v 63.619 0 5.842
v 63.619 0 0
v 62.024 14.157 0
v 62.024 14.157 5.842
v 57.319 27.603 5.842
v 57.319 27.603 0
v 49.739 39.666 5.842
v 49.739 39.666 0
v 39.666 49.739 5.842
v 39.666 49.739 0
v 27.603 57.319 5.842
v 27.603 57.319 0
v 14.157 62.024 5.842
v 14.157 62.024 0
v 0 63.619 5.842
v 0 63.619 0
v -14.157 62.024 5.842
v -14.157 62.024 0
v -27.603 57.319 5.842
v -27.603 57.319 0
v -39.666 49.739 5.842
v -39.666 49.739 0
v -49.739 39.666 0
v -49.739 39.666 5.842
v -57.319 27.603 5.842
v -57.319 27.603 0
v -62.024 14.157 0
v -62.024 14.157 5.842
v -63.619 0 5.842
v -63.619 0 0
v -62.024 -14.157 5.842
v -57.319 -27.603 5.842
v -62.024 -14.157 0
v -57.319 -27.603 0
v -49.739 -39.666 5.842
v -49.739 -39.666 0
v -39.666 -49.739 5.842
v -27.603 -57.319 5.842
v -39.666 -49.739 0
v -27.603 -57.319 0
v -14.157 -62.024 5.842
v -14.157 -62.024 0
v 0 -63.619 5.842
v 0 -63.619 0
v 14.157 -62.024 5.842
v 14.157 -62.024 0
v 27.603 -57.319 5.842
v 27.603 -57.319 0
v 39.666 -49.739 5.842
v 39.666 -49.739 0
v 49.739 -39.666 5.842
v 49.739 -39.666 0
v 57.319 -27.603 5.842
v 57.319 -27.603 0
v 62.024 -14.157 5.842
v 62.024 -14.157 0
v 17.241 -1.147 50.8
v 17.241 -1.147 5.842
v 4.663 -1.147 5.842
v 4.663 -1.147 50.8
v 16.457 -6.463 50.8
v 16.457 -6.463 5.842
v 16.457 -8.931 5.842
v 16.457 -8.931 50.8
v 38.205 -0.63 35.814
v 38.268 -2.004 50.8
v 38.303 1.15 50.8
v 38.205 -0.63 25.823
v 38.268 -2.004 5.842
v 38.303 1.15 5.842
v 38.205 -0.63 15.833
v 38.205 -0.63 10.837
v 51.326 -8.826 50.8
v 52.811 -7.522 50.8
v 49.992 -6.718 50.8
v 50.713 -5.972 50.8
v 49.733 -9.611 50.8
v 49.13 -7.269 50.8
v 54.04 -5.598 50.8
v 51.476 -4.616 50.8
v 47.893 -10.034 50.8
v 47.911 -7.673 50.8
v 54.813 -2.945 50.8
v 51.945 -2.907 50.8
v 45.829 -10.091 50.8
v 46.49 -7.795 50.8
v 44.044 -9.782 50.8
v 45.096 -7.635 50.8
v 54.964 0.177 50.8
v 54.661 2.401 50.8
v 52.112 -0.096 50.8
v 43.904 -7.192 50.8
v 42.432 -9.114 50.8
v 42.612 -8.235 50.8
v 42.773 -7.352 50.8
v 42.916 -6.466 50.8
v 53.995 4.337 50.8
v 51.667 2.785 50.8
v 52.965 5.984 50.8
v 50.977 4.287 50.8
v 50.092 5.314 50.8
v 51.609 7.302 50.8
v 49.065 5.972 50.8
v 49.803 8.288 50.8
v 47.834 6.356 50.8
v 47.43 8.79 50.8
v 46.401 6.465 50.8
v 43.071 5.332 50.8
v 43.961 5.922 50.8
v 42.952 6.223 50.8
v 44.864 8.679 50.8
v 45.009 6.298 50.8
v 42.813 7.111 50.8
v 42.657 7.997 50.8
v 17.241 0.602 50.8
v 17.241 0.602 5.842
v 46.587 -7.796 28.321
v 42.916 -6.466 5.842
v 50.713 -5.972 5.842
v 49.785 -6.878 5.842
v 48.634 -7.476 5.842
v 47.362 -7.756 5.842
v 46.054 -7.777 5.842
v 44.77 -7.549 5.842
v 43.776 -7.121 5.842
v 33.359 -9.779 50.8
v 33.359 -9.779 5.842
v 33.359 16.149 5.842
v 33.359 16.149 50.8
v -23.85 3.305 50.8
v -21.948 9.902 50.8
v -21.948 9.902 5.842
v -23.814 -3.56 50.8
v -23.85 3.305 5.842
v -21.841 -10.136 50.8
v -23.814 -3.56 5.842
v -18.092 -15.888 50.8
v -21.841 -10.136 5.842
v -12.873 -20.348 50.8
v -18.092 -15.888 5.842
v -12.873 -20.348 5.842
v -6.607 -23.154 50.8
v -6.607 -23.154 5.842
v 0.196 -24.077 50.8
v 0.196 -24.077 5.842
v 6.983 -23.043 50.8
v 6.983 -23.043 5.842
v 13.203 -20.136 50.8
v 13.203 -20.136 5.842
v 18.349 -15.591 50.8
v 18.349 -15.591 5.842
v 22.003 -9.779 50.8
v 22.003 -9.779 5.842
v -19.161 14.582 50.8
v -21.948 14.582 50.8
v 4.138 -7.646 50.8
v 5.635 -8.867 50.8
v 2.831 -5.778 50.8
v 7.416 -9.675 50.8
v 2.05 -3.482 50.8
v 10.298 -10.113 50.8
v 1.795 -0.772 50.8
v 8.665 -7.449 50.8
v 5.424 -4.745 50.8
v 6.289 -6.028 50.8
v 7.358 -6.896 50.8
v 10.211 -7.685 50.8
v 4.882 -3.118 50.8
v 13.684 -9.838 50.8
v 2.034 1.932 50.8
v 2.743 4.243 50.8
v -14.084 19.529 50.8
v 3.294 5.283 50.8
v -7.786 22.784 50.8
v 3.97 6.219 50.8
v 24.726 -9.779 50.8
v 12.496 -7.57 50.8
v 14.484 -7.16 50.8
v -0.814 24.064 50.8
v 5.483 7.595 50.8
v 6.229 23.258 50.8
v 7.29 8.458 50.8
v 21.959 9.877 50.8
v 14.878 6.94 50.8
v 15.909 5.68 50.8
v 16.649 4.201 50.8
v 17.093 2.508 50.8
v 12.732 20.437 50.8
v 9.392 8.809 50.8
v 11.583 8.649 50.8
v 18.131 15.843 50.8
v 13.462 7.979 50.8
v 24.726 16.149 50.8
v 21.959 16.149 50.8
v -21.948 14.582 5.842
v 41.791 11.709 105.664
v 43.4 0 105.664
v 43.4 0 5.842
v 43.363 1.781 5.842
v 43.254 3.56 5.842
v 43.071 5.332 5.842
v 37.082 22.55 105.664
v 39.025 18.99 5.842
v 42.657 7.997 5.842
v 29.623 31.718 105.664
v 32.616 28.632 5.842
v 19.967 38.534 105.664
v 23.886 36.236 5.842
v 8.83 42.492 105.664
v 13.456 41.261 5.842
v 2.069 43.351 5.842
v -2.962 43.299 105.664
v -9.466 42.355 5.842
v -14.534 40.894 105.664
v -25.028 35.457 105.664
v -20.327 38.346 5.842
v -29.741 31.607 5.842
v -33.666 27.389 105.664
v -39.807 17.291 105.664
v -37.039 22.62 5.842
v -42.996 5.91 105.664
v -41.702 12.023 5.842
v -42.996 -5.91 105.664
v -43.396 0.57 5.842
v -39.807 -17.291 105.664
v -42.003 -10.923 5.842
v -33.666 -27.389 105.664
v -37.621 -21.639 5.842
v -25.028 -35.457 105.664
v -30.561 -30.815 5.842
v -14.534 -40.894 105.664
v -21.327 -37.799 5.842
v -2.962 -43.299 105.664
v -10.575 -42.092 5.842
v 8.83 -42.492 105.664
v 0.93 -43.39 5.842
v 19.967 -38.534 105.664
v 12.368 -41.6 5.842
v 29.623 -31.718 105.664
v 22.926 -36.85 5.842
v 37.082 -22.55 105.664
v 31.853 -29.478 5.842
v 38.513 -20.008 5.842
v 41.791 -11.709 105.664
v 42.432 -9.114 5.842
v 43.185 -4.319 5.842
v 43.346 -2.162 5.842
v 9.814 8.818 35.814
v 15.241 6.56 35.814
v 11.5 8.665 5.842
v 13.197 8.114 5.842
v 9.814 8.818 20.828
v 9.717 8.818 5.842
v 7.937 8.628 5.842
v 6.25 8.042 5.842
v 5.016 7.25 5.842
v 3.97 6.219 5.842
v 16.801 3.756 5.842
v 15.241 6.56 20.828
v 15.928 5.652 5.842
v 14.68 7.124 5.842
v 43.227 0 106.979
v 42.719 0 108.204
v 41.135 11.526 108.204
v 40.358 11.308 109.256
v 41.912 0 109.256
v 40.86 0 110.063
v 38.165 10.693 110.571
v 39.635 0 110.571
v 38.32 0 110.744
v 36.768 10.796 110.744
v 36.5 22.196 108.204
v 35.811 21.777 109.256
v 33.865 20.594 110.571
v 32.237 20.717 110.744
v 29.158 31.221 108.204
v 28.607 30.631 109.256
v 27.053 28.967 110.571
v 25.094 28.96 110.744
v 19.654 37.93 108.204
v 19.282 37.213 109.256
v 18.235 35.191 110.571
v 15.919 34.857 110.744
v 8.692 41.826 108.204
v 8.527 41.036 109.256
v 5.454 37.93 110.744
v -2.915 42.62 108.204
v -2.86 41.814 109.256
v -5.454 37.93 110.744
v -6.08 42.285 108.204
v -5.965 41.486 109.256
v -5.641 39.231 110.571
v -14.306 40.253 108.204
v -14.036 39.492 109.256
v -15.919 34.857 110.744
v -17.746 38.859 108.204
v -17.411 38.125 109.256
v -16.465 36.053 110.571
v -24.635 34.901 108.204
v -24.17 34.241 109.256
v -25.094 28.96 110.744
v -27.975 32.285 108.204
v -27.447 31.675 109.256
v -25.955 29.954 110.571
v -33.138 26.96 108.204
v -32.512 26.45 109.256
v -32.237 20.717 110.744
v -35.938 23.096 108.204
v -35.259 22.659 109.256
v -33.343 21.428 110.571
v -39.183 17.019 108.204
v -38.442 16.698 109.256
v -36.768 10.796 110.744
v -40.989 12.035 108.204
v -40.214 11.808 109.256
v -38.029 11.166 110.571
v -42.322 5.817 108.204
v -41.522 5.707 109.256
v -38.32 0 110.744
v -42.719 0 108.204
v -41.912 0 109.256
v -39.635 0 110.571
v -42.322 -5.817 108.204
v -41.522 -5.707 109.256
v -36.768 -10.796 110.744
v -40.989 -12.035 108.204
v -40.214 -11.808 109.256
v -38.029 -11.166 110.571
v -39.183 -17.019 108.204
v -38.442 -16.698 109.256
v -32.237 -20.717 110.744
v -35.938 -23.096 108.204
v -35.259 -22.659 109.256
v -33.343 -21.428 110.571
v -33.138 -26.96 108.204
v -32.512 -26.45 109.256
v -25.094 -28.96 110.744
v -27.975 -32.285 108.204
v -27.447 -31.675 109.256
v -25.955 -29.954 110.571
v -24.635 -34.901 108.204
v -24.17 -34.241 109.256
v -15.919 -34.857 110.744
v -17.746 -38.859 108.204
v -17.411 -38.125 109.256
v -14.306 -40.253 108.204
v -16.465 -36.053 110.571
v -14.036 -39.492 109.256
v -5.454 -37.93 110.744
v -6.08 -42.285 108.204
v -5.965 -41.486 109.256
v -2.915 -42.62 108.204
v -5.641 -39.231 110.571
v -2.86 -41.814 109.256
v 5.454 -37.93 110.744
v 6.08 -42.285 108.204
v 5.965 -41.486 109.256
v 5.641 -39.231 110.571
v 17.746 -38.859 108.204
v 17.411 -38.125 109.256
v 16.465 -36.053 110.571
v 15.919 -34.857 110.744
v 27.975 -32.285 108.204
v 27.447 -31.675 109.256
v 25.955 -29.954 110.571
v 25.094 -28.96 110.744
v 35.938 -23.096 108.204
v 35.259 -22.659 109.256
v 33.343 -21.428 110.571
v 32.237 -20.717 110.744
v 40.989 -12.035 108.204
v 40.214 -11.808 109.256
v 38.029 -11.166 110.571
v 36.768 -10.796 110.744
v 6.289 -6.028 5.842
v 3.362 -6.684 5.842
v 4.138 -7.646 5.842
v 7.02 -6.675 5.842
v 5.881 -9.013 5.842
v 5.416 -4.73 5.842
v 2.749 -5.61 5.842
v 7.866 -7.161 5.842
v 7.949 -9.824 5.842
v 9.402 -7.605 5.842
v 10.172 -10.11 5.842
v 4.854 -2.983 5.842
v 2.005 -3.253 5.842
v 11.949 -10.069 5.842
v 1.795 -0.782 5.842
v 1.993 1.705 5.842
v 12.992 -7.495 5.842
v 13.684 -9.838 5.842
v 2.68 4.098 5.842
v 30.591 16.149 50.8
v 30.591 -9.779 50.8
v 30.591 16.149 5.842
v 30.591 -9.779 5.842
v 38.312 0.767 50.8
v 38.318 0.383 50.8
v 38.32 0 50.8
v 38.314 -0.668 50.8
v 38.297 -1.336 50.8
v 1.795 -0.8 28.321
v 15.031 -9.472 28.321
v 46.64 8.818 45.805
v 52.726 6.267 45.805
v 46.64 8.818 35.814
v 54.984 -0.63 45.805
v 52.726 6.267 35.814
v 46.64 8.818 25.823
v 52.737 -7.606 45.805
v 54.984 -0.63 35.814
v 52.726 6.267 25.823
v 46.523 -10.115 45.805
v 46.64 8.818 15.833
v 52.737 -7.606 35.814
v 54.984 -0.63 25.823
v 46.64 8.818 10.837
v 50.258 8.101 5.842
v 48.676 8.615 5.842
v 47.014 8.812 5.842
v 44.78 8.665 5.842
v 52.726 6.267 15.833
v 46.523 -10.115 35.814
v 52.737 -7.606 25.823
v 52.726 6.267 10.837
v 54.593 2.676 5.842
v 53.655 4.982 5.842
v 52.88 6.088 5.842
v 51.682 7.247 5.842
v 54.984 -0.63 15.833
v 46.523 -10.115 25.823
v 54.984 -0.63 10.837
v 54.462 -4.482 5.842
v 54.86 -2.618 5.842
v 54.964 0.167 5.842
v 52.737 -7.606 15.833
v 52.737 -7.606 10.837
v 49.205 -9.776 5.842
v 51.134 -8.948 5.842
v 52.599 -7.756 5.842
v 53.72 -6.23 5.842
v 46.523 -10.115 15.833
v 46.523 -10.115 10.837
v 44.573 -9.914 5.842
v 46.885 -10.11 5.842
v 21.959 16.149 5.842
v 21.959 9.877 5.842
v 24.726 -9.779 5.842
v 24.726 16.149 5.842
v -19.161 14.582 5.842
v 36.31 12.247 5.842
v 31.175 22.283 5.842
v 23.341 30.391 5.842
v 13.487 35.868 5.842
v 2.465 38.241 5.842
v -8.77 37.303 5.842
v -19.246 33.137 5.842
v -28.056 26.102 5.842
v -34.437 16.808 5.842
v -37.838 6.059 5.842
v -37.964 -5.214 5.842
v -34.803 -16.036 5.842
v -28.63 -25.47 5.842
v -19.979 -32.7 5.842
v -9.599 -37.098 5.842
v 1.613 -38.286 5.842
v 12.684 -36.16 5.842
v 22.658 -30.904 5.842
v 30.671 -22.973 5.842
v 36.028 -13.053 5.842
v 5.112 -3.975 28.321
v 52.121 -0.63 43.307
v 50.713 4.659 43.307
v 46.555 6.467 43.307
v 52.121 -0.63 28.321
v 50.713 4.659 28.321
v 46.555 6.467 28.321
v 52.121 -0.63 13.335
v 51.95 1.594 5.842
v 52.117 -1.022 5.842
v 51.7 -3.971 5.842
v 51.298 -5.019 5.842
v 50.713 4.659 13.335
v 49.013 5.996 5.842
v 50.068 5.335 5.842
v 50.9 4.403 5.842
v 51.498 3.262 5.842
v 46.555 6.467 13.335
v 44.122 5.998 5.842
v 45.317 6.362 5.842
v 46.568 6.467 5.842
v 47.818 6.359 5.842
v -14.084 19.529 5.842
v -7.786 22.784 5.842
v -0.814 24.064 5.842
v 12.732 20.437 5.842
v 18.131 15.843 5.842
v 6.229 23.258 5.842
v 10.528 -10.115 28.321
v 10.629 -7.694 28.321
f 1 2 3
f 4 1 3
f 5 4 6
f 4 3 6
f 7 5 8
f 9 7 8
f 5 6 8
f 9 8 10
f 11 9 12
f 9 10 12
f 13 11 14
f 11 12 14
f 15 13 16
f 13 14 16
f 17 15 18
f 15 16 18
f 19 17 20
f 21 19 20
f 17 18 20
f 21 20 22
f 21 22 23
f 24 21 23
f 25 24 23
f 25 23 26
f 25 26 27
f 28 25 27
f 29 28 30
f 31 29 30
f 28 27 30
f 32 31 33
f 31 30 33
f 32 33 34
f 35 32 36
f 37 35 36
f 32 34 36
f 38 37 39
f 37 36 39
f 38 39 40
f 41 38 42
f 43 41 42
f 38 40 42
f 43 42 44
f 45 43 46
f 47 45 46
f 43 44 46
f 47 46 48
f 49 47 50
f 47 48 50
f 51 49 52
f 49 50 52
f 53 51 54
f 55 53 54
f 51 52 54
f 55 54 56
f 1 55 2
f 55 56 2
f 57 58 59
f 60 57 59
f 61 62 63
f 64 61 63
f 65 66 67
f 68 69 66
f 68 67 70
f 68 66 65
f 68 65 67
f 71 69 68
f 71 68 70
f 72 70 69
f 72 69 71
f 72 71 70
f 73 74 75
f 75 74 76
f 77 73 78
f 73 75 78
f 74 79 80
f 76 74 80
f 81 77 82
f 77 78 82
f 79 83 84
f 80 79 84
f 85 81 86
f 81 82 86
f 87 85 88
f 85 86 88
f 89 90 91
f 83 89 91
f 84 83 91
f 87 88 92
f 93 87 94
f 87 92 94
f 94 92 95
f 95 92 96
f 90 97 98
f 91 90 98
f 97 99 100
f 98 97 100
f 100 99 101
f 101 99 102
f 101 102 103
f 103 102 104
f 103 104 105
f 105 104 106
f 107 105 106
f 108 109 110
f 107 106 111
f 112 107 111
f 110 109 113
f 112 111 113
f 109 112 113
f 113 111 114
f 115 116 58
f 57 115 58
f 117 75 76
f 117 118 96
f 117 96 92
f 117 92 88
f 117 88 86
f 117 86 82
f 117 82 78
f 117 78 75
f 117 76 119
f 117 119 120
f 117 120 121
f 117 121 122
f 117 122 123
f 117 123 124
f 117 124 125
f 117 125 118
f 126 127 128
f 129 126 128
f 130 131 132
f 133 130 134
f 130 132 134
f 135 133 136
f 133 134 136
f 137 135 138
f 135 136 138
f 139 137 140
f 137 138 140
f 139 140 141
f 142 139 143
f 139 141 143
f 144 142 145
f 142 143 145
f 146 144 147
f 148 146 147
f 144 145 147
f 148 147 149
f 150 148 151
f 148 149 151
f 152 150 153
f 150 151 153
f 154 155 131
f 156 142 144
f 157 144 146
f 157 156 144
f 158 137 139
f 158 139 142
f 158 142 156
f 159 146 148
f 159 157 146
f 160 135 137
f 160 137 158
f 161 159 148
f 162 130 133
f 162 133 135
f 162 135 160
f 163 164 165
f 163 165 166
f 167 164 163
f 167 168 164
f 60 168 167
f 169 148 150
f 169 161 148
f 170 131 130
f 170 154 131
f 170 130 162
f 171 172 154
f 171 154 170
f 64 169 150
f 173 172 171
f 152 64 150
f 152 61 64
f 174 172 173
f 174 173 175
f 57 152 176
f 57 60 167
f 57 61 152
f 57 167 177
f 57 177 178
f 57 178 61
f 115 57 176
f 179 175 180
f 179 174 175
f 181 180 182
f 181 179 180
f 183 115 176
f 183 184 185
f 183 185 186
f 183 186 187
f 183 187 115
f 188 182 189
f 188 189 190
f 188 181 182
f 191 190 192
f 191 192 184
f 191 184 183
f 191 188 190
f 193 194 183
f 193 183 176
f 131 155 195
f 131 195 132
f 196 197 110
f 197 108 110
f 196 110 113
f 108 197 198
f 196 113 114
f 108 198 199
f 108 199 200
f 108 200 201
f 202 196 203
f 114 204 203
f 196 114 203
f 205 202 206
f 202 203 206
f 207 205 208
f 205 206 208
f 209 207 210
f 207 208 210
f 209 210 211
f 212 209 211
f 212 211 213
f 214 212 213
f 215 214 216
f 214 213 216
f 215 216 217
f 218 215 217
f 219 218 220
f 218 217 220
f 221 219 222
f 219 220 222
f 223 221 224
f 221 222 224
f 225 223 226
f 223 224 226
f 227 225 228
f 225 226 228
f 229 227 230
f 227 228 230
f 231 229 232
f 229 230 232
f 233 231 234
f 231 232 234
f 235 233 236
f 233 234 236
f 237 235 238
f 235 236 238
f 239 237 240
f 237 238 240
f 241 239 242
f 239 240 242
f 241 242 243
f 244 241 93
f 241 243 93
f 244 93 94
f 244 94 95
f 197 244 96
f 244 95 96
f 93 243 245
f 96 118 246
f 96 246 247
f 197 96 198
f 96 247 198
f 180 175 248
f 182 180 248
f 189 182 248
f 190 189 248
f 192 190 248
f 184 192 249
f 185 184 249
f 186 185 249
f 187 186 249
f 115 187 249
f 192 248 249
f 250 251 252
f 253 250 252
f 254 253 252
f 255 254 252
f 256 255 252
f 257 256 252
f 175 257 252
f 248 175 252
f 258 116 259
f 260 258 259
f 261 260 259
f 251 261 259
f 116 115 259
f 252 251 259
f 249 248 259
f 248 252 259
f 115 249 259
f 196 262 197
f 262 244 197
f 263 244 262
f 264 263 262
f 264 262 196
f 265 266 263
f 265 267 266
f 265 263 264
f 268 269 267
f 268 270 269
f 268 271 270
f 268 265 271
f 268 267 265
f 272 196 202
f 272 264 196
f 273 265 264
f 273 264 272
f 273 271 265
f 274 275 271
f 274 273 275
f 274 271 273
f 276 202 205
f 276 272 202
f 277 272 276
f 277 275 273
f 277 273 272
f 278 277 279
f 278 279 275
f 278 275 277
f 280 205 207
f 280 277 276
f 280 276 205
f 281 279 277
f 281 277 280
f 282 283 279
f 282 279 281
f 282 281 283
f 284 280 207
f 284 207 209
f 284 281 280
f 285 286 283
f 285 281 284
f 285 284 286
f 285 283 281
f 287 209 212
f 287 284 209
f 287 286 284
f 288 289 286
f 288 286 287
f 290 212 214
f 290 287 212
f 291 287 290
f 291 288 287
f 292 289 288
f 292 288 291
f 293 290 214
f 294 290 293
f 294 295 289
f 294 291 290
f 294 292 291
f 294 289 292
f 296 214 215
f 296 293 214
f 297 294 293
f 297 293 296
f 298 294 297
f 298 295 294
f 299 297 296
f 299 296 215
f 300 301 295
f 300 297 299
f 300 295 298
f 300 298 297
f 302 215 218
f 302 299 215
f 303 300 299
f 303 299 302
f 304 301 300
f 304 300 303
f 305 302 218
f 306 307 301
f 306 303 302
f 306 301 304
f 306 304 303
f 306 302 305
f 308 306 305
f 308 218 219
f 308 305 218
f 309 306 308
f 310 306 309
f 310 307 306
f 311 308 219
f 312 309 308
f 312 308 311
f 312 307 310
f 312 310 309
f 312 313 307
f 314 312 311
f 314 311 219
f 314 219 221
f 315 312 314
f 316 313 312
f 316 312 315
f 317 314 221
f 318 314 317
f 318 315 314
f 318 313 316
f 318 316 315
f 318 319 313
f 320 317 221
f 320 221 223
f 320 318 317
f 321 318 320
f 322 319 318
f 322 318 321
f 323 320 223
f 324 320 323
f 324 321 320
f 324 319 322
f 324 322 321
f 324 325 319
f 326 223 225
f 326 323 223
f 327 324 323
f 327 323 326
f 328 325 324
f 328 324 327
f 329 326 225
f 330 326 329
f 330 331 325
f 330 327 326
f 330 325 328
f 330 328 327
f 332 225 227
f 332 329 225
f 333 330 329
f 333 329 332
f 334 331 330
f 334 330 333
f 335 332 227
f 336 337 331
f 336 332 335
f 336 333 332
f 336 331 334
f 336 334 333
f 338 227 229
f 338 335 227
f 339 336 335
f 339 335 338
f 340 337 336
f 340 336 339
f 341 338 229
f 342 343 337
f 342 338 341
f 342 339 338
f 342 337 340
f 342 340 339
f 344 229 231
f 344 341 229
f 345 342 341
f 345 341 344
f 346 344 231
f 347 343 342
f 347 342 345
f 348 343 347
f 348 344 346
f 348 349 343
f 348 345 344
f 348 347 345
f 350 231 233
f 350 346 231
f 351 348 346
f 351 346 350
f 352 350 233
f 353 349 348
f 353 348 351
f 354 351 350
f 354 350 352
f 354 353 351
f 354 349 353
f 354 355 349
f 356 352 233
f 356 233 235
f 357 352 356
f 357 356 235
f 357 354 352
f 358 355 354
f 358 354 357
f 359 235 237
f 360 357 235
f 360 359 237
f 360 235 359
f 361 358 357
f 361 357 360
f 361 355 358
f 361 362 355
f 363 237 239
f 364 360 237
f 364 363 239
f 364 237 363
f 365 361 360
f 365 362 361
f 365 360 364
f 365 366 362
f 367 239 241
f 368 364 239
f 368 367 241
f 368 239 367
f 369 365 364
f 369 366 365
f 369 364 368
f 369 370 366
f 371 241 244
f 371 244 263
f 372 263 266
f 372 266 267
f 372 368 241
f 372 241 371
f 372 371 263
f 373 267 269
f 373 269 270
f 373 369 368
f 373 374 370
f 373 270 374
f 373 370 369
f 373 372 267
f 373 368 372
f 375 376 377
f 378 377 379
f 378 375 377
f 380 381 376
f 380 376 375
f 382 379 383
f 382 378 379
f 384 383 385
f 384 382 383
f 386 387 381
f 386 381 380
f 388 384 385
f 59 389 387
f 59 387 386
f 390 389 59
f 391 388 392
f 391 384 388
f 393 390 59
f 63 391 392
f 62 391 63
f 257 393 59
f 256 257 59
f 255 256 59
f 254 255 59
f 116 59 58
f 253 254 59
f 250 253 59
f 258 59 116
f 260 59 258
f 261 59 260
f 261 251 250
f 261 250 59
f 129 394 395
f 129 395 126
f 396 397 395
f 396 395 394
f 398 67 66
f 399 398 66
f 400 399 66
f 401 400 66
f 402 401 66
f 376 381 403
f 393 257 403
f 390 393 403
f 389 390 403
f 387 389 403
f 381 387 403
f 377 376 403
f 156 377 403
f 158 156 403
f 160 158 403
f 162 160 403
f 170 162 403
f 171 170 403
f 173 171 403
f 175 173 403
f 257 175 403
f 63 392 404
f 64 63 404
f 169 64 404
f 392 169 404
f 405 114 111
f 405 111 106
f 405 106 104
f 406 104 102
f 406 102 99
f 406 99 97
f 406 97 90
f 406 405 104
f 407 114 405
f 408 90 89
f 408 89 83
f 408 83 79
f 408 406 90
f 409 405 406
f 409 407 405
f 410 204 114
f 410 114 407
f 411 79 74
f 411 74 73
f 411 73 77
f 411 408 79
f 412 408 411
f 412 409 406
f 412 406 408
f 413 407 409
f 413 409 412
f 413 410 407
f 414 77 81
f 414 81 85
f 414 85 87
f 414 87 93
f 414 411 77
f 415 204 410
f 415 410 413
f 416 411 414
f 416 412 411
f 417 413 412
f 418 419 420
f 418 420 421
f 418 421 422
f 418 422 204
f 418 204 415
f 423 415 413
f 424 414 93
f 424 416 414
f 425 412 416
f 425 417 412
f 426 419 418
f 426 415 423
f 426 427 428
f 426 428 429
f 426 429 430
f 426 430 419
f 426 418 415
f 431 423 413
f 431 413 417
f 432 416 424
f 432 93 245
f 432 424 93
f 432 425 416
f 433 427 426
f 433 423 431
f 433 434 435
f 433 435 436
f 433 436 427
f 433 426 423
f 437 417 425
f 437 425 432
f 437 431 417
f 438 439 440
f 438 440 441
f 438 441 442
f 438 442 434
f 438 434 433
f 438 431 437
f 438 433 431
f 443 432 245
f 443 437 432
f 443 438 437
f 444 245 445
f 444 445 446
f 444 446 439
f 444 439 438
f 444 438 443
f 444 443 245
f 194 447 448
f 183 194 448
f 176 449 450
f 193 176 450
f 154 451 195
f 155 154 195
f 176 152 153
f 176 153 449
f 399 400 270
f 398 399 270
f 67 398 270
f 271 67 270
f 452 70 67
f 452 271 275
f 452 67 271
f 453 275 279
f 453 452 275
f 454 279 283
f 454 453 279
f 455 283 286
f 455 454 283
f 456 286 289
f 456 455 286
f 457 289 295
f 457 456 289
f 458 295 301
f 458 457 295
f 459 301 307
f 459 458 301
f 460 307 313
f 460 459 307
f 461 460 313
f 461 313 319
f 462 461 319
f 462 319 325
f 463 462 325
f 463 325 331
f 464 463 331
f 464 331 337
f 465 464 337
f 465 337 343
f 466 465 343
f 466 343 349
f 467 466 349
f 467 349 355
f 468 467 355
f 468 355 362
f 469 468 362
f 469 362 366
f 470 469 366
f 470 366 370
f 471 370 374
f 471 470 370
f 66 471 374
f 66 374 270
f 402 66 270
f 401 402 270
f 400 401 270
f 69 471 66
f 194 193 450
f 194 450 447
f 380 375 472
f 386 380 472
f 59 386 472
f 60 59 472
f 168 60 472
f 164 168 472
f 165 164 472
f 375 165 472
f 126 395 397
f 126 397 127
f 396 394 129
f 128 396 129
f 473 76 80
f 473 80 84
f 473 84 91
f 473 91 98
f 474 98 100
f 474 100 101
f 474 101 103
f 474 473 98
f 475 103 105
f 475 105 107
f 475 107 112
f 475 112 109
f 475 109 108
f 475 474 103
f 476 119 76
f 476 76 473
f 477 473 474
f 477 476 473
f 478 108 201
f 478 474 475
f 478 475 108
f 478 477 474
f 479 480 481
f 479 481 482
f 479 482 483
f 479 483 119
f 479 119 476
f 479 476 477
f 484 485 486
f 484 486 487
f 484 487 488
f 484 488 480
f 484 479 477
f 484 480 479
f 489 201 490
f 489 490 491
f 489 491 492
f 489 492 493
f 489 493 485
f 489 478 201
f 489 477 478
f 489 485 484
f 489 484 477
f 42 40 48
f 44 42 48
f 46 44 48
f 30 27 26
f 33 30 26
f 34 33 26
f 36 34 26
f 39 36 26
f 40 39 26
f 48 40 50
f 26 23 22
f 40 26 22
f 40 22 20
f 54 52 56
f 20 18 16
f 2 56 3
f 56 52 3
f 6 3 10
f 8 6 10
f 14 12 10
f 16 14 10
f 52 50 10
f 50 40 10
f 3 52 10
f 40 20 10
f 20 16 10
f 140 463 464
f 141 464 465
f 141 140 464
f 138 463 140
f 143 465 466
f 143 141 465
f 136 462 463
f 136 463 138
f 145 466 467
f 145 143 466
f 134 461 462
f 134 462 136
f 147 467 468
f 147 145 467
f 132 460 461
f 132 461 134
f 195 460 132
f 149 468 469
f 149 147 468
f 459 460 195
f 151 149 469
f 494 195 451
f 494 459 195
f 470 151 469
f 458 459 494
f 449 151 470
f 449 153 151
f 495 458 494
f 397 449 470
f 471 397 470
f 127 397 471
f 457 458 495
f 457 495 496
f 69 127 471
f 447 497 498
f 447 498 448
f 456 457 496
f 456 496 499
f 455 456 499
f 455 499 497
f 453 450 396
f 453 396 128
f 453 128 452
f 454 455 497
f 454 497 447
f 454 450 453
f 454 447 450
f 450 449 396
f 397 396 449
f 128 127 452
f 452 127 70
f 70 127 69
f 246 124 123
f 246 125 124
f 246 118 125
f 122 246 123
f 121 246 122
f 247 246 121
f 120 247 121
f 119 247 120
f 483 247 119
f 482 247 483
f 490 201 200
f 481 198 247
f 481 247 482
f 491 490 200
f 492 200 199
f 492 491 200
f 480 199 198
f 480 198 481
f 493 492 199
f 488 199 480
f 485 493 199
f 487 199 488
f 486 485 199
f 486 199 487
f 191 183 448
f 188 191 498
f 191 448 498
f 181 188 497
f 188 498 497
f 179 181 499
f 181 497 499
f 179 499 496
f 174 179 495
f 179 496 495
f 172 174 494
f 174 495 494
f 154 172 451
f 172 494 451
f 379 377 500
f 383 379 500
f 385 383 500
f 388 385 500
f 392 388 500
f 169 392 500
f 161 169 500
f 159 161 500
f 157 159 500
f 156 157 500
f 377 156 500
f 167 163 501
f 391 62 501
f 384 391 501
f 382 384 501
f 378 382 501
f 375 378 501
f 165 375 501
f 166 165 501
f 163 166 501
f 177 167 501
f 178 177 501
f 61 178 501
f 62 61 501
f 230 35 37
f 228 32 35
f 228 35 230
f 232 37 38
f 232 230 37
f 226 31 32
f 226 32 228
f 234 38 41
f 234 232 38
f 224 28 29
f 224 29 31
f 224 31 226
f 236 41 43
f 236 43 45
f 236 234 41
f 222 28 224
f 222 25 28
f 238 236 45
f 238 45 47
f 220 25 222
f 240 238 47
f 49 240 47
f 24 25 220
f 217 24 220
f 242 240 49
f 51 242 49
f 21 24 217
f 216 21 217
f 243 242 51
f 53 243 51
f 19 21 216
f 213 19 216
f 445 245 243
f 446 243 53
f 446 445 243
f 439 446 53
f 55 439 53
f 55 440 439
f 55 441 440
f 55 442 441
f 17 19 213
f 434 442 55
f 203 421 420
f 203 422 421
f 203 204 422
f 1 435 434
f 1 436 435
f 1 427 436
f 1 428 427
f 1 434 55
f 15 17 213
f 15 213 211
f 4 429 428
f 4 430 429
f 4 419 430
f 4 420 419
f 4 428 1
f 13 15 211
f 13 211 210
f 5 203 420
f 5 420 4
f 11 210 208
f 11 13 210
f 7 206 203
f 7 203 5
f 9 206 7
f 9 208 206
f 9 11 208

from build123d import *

# Parameters (mm, degrees)
F0_R     = 43.4000447198
F1_DEPTH = 110.744
F2_T     = -5.08
F3_R     = 63.6187489092
F4_DEPTH = 5.842
F5_R     = 5.07999
F6_W     = 2.7671808675
F6_H     = 25.928324776
F7_DEPTH = 50.8


# Not quite as in the source:
# - a fillet or chamfer is up to 0.001 mm smaller than in the source, because OpenCascade refuses the exact size


with BuildPart() as f1:
    # F0 (on Top) → F1 (new body)
    with BuildSketch(Plane.XY):
        Circle(F0_R)
    extrude(amount=F1_DEPTH)

    # F2
    f2_openings = [f1.faces().sort_by_distance(p)[0] for p in [
        (0, 0, 110.744),
    ]]
    offset(amount=F2_T, openings=f2_openings)

    # F3 (on Top) → F4 (join)
    with BuildSketch(Plane.XY):
        Circle(F3_R)
    extrude(amount=F4_DEPTH)

    # F5 (radius 5.08 in the source; OpenCascade refuses exactly that, so slightly less here)
    f5_edges = [f1.edges().sort_by_distance(p)[0] for p in [
        (-43.400045, 0, 110.744),
    ]]
    fillet(f5_edges, radius=F5_R)

    # F6 (on Top) → F7 (join)
    with BuildSketch(Plane.XY):
        with BuildLine():
            ThreePointArc((22.0028883346, -9.7789997235), (23.5536000152, -4.9983854371), (24.0781214104, 0))
            ThreePointArc((24.0781214104, 0), (23.5424460635, 5.0506597592), (21.9592547789, 9.8765915281))
            Line((21.9592547789, 9.8765915281), (21.9592547789, -9.7789997235))
            Line((21.9592547789, -9.7789997235), (22.0028883346, -9.7789997235))
        make_face()
        with BuildLine():
            ThreePointArc((21.9592547789, 9.8765915281), (23.5424460635, 5.0506597592), (24.0781214104, 0))
            ThreePointArc((24.0781214104, 0), (23.5536000152, -4.9983854371), (22.0028883346, -9.7789997235))
            Line((22.0028883346, -9.7789997235), (24.7264356464, -9.7789997235))
            Line((24.7264356464, -9.7789997235), (24.7264356464, 16.1493250525))
            Line((24.7264356464, 16.1493250525), (21.9592547789, 16.1493250525))
            Line((21.9592547789, 16.1493250525), (21.9592547789, 9.8765915281))
        make_face()
        with BuildLine():
            Line((21.9592547789, -9.7789997235), (21.9592547789, 9.8765915281))
            ThreePointArc((21.9592547789, 9.8765915281), (2.7373131328, 23.9220201377), (-19.1605677938, 14.5817890698))
            Line((-19.1605677938, 14.5817890698), (-19.1165860754, 14.5817890698))
            Line((-19.1165860754, 14.5817890698), (-19.1165860754, 4.2168572654))
            Line((-19.1165860754, 4.2168572654), (-6.283051686, 4.2168572654))
            Line((-6.283051686, 4.2168572654), (-6.283051686, 14.5817890698))
            Line((-6.283051686, 14.5817890698), (-3.4518897579, 14.5817890698))
            Line((-3.4518897579, 14.5817890698), (-3.4518897579, -9.7789997235))
            Line((-3.4518897579, -9.7789997235), (-6.283051686, -9.7789997235))
            Line((-6.283051686, -9.7789997235), (-6.283051686, 1.6842736198))
            Line((-6.283051686, 1.6842736198), (-19.1165860754, 1.6842736198))
            Line((-19.1165860754, 1.6842736198), (-19.1165860754, -9.7789997235))
            Line((-19.1165860754, -9.7789997235), (-21.9477480035, -9.7789997235))
            Line((-21.9477480035, -9.7789997235), (-21.9477480035, 9.9021355389))
            ThreePointArc((-21.9477480035, 9.9021355389), (-9.8406062526, -21.9754044158), (22.0028883346, -9.7789997235))
            Line((22.0028883346, -9.7789997235), (21.9592547789, -9.7789997235))
        make_face()
        with BuildLine():
            add(Edge.make_bspline(
                [(13.6843709515, -9.837649029), (12.3780909659, -10.1149002912), (10.5279719658, -10.1149002912)],
                knots=[0, 0, 0, 1, 1, 1], degree=2))
            add(Edge.make_bspline(
                [(10.5279719658, -10.1149002912), (6.4811698879, -10.1149002912), (4.1378635463, -7.6462977061)],
                knots=[0, 0, 0, 1, 1, 1], degree=2))
            add(Edge.make_bspline(
                [(4.1378635463, -7.6462977061), (1.7945572048, -5.177695121), (1.7945572048, -0.8003242304)],
                knots=[0, 0, 0, 1, 1, 1], degree=2))
            add(Edge.make_bspline(
                [(1.7945572048, -0.8003242304), (1.7945572048, 3.6197007006), (3.9699132625, 6.2189312842)],
                knots=[0, 0, 0, 1, 1, 1], degree=2))
            add(Edge.make_bspline(
                [(3.9699132625, 6.2189312842), (6.1452693202, 8.8181618679), (9.81351679, 8.8181618679)],
                knots=[0, 0, 0, 1, 1, 1], degree=2))
            add(Edge.make_bspline(
                [(9.81351679, 8.8181618679), (13.2418352829, 8.8181618679), (15.2412434242, 6.560163607)],
                knots=[0, 0, 0, 1, 1, 1], degree=2))
            add(Edge.make_bspline(
                [(15.2412434242, 6.560163607), (17.2406515655, 4.3021653461), (17.2406515655, 0.601927346)],
                knots=[0, 0, 0, 1, 1, 1], degree=2))
            Line((17.2406515655, 0.601927346), (17.2406515655, -1.1468883082))
            Line((17.2406515655, -1.1468883082), (4.6630414181, -1.1468883082))
            add(Edge.make_bspline(
                [(4.6630414181, -1.1468883082), (4.7483494988, -4.3619365994), (6.2892267063, -6.0281100505)],
                knots=[0, 0, 0, 1, 1, 1], degree=2))
            add(Edge.make_bspline(
                [(6.2892267063, -6.0281100505), (7.8301039139, -7.6942835015), (10.6292753117, -7.6942835015)],
                knots=[0, 0, 0, 1, 1, 1], degree=2))
            add(Edge.make_bspline(
                [(10.6292753117, -7.6942835015), (13.5777358507, -7.6942835015), (16.4568835741, -6.4626480865)],
                knots=[0, 0, 0, 1, 1, 1], degree=2))
            Line((16.4568835741, -6.4626480865), (16.4568835741, -8.9312506716))
            add(Edge.make_bspline(
                [(16.4568835741, -8.9312506716), (14.9906509372, -9.5603977667), (13.6843709515, -9.837649029)],
                knots=[0, 0, 0, 1, 1, 1], degree=2))
        make_face(mode=Mode.SUBTRACT)
        with BuildLine():
            Line((-19.1165860754, 14.5817890698), (-19.1605677938, 14.5817890698))
            ThreePointArc((-19.1605677938, 14.5817890698), (-20.6869088124, 12.3210281406), (-21.9477480035, 9.9021355389))
            Line((-21.9477480035, 9.9021355389), (-21.9477480035, -9.7789997235))
            Line((-21.9477480035, -9.7789997235), (-19.1165860754, -9.7789997235))
            Line((-19.1165860754, -9.7789997235), (-19.1165860754, 1.6842736198))
            Line((-19.1165860754, 1.6842736198), (-6.283051686, 1.6842736198))
            Line((-6.283051686, 1.6842736198), (-6.283051686, -9.7789997235))
            Line((-6.283051686, -9.7789997235), (-3.4518897579, -9.7789997235))
            Line((-3.4518897579, -9.7789997235), (-3.4518897579, 14.5817890698))
            Line((-3.4518897579, 14.5817890698), (-6.283051686, 14.5817890698))
            Line((-6.283051686, 14.5817890698), (-6.283051686, 4.2168572654))
            Line((-6.283051686, 4.2168572654), (-19.1165860754, 4.2168572654))
            Line((-19.1165860754, 4.2168572654), (-19.1165860754, 14.5817890698))
        make_face()
        with BuildLine():
            ThreePointArc((-21.9477480035, 9.9021355389), (-20.6869088124, 12.3210281406), (-19.1605677938, 14.5817890698))
            Line((-19.1605677938, 14.5817890698), (-21.9477480035, 14.5817890698))
            Line((-21.9477480035, 14.5817890698), (-21.9477480035, 9.9021355389))
        make_face()
        with Locations((31.9749566279, 3.1851626645)):
            Rectangle(F6_W, F6_H)
        with BuildLine():
            add(Edge.make_bspline(
                [(54.9841455177, -0.629708069), (54.9841455177, -5.0977187954), (52.7368107669, -7.6063095433)],
                knots=[0, 0, 0, 1, 1, 1], degree=2))
            add(Edge.make_bspline(
                [(52.7261472568, 6.2669170796), (54.9841455177, 3.7156722913), (54.9841455177, -0.629708069)],
                knots=[0, 0, 0, 1, 1, 1], degree=2))
            add(Edge.make_bspline(
                [(46.6399488748, 8.8181618679), (50.4681489959, 8.8181618679), (52.7261472568, 6.2669170796)],
                knots=[0, 0, 0, 1, 1, 1], degree=2))
            add(Edge.make_bspline(
                [(40.4391177593, 6.3255663851), (42.6731231225, 8.8181618679), (46.6399488748, 8.8181618679)],
                knots=[0, 0, 0, 1, 1, 1], degree=2))
            add(Edge.make_bspline(
                [(38.2051123961, -0.629708069), (38.2051123961, 3.8329709023), (40.4391177593, 6.3255663851)],
                knots=[0, 0, 0, 1, 1, 1], degree=2))
            add(Edge.make_bspline(
                [(39.2394728745, -5.66288483), (38.2051123961, -3.5141875475), (38.2051123961, -0.629708069)],
                knots=[0, 0, 0, 1, 1, 1], degree=2))
            add(Edge.make_bspline(
                [(42.1719381484, -8.9632412019), (40.2738333529, -7.8115821125), (39.2394728745, -5.66288483)],
                knots=[0, 0, 0, 1, 1, 1], degree=2))
            add(Edge.make_bspline(
                [(46.5226502638, -10.1149002912), (44.0700429438, -10.1149002912), (42.1719381484, -8.9632412019)],
                knots=[0, 0, 0, 1, 1, 1], degree=2))
            add(Edge.make_bspline(
                [(52.7368107669, -7.6063095433), (50.4894760161, -10.1149002912), (46.5226502638, -10.1149002912)],
                knots=[0, 0, 0, 1, 1, 1], degree=2))
        make_face()
        with BuildLine():
            add(Edge.make_bspline(
                [(41.0735966094, -0.629708069), (41.0735966094, -4.1326711325), (42.4731823083, -5.9641289899)],
                knots=[0, 0, 0, 1, 1, 1], degree=2))
            add(Edge.make_bspline(
                [(42.4571870432, 4.6833858317), (41.0735966094, 2.8999137697), (41.0735966094, -0.629708069)],
                knots=[0, 0, 0, 1, 1, 1], degree=2))
            add(Edge.make_bspline(
                [(46.5546407941, 6.4668578937), (43.840777477, 6.4668578937), (42.4571870432, 4.6833858317)],
                knots=[0, 0, 0, 1, 1, 1], degree=2))
            add(Edge.make_bspline(
                [(50.7134097279, 4.659392934), (49.3058263964, 6.4668578937), (46.5546407941, 6.4668578937)],
                knots=[0, 0, 0, 1, 1, 1], degree=2))
            add(Edge.make_bspline(
                [(52.1209930594, -0.629708069), (52.1209930594, 2.8519279743), (50.7134097279, 4.659392934)],
                knots=[0, 0, 0, 1, 1, 1], degree=2))
            add(Edge.make_bspline(
                [(50.7134097279, -5.9721266225), (52.1209930594, -4.1486663977), (52.1209930594, -0.629708069)],
                knots=[0, 0, 0, 1, 1, 1], degree=2))
            add(Edge.make_bspline(
                [(46.5866313243, -7.7955868474), (49.3058263964, -7.7955868474), (50.7134097279, -5.9721266225)],
                knots=[0, 0, 0, 1, 1, 1], degree=2))
            add(Edge.make_bspline(
                [(42.4731823083, -5.9641289899), (43.8727680072, -7.7955868474), (46.5866313243, -7.7955868474)],
                knots=[0, 0, 0, 1, 1, 1], degree=2))
        make_face(mode=Mode.SUBTRACT)
    extrude(amount=F7_DEPTH)


solid = f1.part
